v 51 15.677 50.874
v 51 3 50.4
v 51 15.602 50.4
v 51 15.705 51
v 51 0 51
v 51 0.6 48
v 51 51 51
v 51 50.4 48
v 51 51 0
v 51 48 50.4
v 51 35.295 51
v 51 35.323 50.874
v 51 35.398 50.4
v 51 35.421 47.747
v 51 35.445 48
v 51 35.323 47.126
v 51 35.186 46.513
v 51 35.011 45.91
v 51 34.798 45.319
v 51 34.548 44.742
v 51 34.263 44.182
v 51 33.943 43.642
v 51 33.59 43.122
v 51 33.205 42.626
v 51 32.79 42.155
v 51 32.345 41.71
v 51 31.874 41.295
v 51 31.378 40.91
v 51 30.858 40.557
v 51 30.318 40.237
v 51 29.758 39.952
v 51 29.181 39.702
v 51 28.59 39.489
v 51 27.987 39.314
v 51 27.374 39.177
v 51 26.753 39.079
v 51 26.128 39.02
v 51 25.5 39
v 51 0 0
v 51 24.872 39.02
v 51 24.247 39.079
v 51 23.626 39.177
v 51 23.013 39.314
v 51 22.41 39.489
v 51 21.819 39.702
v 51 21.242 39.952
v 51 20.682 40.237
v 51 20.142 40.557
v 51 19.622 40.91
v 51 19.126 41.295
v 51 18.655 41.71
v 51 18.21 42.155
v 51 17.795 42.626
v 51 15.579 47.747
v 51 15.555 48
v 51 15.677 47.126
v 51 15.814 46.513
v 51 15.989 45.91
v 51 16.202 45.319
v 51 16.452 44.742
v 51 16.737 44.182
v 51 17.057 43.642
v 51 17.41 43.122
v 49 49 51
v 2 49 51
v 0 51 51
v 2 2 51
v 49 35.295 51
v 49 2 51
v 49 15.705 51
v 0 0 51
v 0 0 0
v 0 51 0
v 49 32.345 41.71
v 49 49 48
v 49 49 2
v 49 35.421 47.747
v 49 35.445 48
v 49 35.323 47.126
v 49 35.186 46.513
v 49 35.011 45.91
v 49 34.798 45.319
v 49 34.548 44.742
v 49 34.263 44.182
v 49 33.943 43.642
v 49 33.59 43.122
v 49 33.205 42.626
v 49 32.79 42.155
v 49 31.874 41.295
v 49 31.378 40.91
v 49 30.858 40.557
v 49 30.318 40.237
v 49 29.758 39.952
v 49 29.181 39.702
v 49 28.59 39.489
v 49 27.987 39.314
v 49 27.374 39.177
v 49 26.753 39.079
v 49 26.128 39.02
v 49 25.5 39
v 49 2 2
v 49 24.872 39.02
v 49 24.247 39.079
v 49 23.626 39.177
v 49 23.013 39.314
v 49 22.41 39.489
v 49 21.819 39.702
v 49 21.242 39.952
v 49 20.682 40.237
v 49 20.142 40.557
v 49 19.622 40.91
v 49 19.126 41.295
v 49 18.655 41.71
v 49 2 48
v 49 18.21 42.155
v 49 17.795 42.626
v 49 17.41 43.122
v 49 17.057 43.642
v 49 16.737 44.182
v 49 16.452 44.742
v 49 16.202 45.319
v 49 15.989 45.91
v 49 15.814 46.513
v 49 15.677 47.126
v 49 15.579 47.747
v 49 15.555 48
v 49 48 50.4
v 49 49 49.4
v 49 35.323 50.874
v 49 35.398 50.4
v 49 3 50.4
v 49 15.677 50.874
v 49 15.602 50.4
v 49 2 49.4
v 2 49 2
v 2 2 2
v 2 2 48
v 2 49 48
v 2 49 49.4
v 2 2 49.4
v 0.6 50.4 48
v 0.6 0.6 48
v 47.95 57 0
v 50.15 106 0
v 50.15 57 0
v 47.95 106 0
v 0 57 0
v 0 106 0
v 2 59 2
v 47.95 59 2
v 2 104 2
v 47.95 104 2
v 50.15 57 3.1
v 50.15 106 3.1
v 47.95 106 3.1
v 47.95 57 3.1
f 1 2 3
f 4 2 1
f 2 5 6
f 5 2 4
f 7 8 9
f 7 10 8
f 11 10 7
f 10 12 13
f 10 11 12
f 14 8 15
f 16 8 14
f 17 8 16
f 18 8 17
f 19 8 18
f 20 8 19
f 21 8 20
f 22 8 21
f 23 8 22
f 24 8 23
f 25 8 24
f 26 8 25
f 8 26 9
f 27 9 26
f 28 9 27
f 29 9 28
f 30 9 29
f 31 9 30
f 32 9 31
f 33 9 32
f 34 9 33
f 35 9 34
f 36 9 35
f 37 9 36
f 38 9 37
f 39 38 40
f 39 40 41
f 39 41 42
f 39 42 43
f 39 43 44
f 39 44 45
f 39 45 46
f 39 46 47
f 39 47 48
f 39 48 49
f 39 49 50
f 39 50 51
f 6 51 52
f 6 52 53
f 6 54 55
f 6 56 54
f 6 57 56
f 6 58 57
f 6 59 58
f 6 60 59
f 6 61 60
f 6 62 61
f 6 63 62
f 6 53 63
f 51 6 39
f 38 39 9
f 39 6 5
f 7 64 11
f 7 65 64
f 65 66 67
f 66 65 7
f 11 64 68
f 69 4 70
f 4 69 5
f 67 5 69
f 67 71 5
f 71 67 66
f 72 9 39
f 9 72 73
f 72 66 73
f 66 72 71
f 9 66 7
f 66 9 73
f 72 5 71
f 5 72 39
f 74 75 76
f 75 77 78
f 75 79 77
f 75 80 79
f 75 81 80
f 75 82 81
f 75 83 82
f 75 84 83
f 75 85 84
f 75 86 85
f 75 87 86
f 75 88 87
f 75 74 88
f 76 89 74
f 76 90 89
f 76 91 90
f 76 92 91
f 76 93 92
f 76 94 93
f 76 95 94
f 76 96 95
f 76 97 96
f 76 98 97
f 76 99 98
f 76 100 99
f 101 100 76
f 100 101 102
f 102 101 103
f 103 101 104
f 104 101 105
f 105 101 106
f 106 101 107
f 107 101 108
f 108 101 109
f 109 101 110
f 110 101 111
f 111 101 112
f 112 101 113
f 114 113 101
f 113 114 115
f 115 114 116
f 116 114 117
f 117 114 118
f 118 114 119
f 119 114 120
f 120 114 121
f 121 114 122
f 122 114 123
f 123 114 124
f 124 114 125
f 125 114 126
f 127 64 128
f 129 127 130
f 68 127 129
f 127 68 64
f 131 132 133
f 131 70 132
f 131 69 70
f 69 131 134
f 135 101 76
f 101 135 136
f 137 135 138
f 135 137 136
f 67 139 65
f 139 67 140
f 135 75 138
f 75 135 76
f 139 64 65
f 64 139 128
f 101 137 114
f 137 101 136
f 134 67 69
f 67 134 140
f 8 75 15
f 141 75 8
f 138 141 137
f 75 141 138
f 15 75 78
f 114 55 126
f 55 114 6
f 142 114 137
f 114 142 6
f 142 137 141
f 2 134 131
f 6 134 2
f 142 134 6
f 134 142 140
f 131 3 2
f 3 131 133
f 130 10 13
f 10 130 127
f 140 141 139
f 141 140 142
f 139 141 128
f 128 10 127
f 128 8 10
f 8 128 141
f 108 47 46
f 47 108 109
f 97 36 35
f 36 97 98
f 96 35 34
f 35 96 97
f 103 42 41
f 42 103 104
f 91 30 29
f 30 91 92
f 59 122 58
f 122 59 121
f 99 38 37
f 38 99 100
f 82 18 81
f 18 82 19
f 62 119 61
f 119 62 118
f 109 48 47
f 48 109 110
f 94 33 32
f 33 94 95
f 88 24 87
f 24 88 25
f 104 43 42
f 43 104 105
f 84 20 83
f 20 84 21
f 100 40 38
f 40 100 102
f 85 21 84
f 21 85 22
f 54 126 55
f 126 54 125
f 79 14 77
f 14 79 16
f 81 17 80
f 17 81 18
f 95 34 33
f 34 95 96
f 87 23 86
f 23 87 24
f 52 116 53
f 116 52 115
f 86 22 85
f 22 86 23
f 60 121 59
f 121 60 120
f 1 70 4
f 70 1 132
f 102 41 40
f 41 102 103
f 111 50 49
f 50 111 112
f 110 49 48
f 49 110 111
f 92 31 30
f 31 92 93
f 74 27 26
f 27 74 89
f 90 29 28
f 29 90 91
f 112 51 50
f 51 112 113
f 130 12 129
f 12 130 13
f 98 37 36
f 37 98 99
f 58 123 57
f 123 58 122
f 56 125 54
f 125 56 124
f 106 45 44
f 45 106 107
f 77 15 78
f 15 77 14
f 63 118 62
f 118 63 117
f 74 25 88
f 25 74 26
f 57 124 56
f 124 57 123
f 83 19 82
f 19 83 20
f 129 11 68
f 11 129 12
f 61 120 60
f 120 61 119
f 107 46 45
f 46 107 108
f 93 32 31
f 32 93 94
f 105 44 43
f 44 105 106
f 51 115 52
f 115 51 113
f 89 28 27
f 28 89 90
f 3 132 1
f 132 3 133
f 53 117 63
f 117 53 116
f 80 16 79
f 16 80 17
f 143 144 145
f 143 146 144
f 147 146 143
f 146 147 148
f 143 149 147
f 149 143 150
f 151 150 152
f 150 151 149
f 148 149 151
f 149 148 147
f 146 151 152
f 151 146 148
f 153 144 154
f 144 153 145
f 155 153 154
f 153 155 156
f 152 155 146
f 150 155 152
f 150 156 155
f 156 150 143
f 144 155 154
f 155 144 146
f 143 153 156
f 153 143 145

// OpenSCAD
// file: carcassonne_box.scad
/**
 * @file carcassonne_box.scad
 * @author Conlan Wesson (modified by [Your Name])
 * Template for Carcassonne boxes.
 * @copyright Creative Commons Attribution-NonCommercial-ShareAlike 4.0
 */

mm = 1;
cm = 10*mm;

width = 47*mm;
thick = 2.5*mm;
wall = 2*mm;

/**
 * Lid for box.
 * @param sections Array of section lengths.
 * @param columns Number of columns.
 * @param icon Path to icon DXF file.
 * @param rot Icon rotation in degrees.
 * @param mult Icon scale.
 * @param xoff X-offset of icon from center.
 * @param yoff Y-offset of icon from center.
 */
module carcassonne_lid(sections, columns=1, icon=false, icon2=false, icon3=false, rot=0, mult=1, xoff=0, yoff=0, mult2=1, xoff2=0, yoff2=0, mult3=1, xoff3=0, yoff3=0, g=0){
    length = sum(sections) + ((width/2) - (sum(sections) % (width/2)));
    w = length+(1.5*wall)+.1;
    l = (width*columns)+wall;
    h = wall;
    d = 2;

    CubePoints = [
        [ 0-g, 0-g,   0 ],  //0
        [ w+g, 0-g,   0 ],  //1
        [ w+g, l+g,   0 ],  //2
        [ 0-g, l+g,   0 ],  //3
        [   d,   d, h+g ],  //4
        [   w,   d, h+g ],  //5
        [   w, l-d, h+g ],  //6
        [   d, l-d, h+g ]   //7
    ];
    
    CubeFaces = [
        [0,1,2,3],  // bottom
        [4,5,1,0],  // front
        [7,6,5,4],  // top
        [5,6,2,1],  // right
        [6,7,3,2],  // back
        [7,4,0,3]   // left
    ];
    
    difference(){
        union(){
            polyhedron( CubePoints, CubeFaces );
            translate([w-wall-.15,0,0]) cube([wall+.2,l, (1.5*wall)+.1]);
        }
        if(icon){
            translate([w/2+xoff,l/3+yoff,h-(wall/2)]){
                linear_extrude(height=(wall)+.1){
                    rotate(rot) scale(mult) import(icon);
                }
            }
        }
        if(icon2){
            translate([w/2+xoff2,l/3+yoff2,h-(wall/2)]){
                linear_extrude(height=(wall)+.1){
                    rotate(rot) scale(mult2) import(icon2);
                }
            }
        }
        if(icon3){
            translate([w/2+xoff3,l/3+yoff3,h-(wall/2)]){
                linear_extrude(height=(wall)+.1){
                    rotate(rot) scale(mult3) import(icon3);
                }
            }
        }
    }
}

/**
 * Carcassonne card box.
 * @param sections Array of section lengths.
 * @param columns Number of columns.
 */
module carcassonne_box(sections, columns=1){
    raw_length = sum(sections);
    extra_space = ((width/2) - (raw_length % (width/2))) % (width/2);
    length = raw_length + extra_space;
    
    section_count = len(sections);
    adjusted_sections = [for (i = [0:section_count-1]) 
        sections[i] + (extra_space / section_count)];
    
    difference(){
        union(){
            difference(){
                // Outer walls
                cube([length+(2*wall), (width*columns)+(2*wall), width+(2*wall)]);
                // Cavity
                translate([wall, wall, wall]){
                    cube([length, width*columns, (width+wall)+.1]);
                }
            }
            // Dividers
            for(col = [0:columns-1]){
                divider_positions = [for(i=0; i<len(adjusted_sections)-1; i=i+1) 
                    sum([for(j=[0:i]) adjusted_sections[j]])];
                for(pos = divider_positions){
                    translate([pos+wall, width*col+wall, 0]) 
                        cube([wall/2, width, width-(2*wall)]);
                }
                if(col > 0){
                    translate([0, width*col+(wall/2), 0]) 
                        cube([length+(2*wall)-18.0, wall/2, width-(2*wall)]);
                }
            }
        }
        union(){
            // Notch
            for(col = [0:columns-1]){
                translate([wall, wall+(width*col), wall]){
                    translate([0, width/2, width])
                    rotate([0, 90, 0]){
                        cylinder(r=10, h=length+(2*wall), $fn=100);
                    }
                }
            }
            // Track
            translate([wall/2,wall/2,width+wall/2]) 
                carcassonne_lid(adjusted_sections, columns, g=0.4);
        }
    }
}

// Helper function to sum an array
function sum(v, i = 0, r = 0) = i < len(v) ? sum(v, i + 1, r + v[i]) : r;
// main file
/**
 * @file spring.scad
 * @author Andrew Hargrave
 * Four Seasons - Spring Carcassonne box.
 * @copyright Creative Commons Attribution-NonCommercial-ShareAlike 4.0
 */

include <carcassonne_box.scad>

mm = 1;
tiles = 2*mm;

sections = [12*tiles];
columns = 1; 
icon="0-spring.dxf";

carcassonne_box(sections, columns);
translate([0,width*columns+10,0]) carcassonne_lid(sections, columns, icon, rot=90, mult=2.2, xoff=21, yoff=-9); 
